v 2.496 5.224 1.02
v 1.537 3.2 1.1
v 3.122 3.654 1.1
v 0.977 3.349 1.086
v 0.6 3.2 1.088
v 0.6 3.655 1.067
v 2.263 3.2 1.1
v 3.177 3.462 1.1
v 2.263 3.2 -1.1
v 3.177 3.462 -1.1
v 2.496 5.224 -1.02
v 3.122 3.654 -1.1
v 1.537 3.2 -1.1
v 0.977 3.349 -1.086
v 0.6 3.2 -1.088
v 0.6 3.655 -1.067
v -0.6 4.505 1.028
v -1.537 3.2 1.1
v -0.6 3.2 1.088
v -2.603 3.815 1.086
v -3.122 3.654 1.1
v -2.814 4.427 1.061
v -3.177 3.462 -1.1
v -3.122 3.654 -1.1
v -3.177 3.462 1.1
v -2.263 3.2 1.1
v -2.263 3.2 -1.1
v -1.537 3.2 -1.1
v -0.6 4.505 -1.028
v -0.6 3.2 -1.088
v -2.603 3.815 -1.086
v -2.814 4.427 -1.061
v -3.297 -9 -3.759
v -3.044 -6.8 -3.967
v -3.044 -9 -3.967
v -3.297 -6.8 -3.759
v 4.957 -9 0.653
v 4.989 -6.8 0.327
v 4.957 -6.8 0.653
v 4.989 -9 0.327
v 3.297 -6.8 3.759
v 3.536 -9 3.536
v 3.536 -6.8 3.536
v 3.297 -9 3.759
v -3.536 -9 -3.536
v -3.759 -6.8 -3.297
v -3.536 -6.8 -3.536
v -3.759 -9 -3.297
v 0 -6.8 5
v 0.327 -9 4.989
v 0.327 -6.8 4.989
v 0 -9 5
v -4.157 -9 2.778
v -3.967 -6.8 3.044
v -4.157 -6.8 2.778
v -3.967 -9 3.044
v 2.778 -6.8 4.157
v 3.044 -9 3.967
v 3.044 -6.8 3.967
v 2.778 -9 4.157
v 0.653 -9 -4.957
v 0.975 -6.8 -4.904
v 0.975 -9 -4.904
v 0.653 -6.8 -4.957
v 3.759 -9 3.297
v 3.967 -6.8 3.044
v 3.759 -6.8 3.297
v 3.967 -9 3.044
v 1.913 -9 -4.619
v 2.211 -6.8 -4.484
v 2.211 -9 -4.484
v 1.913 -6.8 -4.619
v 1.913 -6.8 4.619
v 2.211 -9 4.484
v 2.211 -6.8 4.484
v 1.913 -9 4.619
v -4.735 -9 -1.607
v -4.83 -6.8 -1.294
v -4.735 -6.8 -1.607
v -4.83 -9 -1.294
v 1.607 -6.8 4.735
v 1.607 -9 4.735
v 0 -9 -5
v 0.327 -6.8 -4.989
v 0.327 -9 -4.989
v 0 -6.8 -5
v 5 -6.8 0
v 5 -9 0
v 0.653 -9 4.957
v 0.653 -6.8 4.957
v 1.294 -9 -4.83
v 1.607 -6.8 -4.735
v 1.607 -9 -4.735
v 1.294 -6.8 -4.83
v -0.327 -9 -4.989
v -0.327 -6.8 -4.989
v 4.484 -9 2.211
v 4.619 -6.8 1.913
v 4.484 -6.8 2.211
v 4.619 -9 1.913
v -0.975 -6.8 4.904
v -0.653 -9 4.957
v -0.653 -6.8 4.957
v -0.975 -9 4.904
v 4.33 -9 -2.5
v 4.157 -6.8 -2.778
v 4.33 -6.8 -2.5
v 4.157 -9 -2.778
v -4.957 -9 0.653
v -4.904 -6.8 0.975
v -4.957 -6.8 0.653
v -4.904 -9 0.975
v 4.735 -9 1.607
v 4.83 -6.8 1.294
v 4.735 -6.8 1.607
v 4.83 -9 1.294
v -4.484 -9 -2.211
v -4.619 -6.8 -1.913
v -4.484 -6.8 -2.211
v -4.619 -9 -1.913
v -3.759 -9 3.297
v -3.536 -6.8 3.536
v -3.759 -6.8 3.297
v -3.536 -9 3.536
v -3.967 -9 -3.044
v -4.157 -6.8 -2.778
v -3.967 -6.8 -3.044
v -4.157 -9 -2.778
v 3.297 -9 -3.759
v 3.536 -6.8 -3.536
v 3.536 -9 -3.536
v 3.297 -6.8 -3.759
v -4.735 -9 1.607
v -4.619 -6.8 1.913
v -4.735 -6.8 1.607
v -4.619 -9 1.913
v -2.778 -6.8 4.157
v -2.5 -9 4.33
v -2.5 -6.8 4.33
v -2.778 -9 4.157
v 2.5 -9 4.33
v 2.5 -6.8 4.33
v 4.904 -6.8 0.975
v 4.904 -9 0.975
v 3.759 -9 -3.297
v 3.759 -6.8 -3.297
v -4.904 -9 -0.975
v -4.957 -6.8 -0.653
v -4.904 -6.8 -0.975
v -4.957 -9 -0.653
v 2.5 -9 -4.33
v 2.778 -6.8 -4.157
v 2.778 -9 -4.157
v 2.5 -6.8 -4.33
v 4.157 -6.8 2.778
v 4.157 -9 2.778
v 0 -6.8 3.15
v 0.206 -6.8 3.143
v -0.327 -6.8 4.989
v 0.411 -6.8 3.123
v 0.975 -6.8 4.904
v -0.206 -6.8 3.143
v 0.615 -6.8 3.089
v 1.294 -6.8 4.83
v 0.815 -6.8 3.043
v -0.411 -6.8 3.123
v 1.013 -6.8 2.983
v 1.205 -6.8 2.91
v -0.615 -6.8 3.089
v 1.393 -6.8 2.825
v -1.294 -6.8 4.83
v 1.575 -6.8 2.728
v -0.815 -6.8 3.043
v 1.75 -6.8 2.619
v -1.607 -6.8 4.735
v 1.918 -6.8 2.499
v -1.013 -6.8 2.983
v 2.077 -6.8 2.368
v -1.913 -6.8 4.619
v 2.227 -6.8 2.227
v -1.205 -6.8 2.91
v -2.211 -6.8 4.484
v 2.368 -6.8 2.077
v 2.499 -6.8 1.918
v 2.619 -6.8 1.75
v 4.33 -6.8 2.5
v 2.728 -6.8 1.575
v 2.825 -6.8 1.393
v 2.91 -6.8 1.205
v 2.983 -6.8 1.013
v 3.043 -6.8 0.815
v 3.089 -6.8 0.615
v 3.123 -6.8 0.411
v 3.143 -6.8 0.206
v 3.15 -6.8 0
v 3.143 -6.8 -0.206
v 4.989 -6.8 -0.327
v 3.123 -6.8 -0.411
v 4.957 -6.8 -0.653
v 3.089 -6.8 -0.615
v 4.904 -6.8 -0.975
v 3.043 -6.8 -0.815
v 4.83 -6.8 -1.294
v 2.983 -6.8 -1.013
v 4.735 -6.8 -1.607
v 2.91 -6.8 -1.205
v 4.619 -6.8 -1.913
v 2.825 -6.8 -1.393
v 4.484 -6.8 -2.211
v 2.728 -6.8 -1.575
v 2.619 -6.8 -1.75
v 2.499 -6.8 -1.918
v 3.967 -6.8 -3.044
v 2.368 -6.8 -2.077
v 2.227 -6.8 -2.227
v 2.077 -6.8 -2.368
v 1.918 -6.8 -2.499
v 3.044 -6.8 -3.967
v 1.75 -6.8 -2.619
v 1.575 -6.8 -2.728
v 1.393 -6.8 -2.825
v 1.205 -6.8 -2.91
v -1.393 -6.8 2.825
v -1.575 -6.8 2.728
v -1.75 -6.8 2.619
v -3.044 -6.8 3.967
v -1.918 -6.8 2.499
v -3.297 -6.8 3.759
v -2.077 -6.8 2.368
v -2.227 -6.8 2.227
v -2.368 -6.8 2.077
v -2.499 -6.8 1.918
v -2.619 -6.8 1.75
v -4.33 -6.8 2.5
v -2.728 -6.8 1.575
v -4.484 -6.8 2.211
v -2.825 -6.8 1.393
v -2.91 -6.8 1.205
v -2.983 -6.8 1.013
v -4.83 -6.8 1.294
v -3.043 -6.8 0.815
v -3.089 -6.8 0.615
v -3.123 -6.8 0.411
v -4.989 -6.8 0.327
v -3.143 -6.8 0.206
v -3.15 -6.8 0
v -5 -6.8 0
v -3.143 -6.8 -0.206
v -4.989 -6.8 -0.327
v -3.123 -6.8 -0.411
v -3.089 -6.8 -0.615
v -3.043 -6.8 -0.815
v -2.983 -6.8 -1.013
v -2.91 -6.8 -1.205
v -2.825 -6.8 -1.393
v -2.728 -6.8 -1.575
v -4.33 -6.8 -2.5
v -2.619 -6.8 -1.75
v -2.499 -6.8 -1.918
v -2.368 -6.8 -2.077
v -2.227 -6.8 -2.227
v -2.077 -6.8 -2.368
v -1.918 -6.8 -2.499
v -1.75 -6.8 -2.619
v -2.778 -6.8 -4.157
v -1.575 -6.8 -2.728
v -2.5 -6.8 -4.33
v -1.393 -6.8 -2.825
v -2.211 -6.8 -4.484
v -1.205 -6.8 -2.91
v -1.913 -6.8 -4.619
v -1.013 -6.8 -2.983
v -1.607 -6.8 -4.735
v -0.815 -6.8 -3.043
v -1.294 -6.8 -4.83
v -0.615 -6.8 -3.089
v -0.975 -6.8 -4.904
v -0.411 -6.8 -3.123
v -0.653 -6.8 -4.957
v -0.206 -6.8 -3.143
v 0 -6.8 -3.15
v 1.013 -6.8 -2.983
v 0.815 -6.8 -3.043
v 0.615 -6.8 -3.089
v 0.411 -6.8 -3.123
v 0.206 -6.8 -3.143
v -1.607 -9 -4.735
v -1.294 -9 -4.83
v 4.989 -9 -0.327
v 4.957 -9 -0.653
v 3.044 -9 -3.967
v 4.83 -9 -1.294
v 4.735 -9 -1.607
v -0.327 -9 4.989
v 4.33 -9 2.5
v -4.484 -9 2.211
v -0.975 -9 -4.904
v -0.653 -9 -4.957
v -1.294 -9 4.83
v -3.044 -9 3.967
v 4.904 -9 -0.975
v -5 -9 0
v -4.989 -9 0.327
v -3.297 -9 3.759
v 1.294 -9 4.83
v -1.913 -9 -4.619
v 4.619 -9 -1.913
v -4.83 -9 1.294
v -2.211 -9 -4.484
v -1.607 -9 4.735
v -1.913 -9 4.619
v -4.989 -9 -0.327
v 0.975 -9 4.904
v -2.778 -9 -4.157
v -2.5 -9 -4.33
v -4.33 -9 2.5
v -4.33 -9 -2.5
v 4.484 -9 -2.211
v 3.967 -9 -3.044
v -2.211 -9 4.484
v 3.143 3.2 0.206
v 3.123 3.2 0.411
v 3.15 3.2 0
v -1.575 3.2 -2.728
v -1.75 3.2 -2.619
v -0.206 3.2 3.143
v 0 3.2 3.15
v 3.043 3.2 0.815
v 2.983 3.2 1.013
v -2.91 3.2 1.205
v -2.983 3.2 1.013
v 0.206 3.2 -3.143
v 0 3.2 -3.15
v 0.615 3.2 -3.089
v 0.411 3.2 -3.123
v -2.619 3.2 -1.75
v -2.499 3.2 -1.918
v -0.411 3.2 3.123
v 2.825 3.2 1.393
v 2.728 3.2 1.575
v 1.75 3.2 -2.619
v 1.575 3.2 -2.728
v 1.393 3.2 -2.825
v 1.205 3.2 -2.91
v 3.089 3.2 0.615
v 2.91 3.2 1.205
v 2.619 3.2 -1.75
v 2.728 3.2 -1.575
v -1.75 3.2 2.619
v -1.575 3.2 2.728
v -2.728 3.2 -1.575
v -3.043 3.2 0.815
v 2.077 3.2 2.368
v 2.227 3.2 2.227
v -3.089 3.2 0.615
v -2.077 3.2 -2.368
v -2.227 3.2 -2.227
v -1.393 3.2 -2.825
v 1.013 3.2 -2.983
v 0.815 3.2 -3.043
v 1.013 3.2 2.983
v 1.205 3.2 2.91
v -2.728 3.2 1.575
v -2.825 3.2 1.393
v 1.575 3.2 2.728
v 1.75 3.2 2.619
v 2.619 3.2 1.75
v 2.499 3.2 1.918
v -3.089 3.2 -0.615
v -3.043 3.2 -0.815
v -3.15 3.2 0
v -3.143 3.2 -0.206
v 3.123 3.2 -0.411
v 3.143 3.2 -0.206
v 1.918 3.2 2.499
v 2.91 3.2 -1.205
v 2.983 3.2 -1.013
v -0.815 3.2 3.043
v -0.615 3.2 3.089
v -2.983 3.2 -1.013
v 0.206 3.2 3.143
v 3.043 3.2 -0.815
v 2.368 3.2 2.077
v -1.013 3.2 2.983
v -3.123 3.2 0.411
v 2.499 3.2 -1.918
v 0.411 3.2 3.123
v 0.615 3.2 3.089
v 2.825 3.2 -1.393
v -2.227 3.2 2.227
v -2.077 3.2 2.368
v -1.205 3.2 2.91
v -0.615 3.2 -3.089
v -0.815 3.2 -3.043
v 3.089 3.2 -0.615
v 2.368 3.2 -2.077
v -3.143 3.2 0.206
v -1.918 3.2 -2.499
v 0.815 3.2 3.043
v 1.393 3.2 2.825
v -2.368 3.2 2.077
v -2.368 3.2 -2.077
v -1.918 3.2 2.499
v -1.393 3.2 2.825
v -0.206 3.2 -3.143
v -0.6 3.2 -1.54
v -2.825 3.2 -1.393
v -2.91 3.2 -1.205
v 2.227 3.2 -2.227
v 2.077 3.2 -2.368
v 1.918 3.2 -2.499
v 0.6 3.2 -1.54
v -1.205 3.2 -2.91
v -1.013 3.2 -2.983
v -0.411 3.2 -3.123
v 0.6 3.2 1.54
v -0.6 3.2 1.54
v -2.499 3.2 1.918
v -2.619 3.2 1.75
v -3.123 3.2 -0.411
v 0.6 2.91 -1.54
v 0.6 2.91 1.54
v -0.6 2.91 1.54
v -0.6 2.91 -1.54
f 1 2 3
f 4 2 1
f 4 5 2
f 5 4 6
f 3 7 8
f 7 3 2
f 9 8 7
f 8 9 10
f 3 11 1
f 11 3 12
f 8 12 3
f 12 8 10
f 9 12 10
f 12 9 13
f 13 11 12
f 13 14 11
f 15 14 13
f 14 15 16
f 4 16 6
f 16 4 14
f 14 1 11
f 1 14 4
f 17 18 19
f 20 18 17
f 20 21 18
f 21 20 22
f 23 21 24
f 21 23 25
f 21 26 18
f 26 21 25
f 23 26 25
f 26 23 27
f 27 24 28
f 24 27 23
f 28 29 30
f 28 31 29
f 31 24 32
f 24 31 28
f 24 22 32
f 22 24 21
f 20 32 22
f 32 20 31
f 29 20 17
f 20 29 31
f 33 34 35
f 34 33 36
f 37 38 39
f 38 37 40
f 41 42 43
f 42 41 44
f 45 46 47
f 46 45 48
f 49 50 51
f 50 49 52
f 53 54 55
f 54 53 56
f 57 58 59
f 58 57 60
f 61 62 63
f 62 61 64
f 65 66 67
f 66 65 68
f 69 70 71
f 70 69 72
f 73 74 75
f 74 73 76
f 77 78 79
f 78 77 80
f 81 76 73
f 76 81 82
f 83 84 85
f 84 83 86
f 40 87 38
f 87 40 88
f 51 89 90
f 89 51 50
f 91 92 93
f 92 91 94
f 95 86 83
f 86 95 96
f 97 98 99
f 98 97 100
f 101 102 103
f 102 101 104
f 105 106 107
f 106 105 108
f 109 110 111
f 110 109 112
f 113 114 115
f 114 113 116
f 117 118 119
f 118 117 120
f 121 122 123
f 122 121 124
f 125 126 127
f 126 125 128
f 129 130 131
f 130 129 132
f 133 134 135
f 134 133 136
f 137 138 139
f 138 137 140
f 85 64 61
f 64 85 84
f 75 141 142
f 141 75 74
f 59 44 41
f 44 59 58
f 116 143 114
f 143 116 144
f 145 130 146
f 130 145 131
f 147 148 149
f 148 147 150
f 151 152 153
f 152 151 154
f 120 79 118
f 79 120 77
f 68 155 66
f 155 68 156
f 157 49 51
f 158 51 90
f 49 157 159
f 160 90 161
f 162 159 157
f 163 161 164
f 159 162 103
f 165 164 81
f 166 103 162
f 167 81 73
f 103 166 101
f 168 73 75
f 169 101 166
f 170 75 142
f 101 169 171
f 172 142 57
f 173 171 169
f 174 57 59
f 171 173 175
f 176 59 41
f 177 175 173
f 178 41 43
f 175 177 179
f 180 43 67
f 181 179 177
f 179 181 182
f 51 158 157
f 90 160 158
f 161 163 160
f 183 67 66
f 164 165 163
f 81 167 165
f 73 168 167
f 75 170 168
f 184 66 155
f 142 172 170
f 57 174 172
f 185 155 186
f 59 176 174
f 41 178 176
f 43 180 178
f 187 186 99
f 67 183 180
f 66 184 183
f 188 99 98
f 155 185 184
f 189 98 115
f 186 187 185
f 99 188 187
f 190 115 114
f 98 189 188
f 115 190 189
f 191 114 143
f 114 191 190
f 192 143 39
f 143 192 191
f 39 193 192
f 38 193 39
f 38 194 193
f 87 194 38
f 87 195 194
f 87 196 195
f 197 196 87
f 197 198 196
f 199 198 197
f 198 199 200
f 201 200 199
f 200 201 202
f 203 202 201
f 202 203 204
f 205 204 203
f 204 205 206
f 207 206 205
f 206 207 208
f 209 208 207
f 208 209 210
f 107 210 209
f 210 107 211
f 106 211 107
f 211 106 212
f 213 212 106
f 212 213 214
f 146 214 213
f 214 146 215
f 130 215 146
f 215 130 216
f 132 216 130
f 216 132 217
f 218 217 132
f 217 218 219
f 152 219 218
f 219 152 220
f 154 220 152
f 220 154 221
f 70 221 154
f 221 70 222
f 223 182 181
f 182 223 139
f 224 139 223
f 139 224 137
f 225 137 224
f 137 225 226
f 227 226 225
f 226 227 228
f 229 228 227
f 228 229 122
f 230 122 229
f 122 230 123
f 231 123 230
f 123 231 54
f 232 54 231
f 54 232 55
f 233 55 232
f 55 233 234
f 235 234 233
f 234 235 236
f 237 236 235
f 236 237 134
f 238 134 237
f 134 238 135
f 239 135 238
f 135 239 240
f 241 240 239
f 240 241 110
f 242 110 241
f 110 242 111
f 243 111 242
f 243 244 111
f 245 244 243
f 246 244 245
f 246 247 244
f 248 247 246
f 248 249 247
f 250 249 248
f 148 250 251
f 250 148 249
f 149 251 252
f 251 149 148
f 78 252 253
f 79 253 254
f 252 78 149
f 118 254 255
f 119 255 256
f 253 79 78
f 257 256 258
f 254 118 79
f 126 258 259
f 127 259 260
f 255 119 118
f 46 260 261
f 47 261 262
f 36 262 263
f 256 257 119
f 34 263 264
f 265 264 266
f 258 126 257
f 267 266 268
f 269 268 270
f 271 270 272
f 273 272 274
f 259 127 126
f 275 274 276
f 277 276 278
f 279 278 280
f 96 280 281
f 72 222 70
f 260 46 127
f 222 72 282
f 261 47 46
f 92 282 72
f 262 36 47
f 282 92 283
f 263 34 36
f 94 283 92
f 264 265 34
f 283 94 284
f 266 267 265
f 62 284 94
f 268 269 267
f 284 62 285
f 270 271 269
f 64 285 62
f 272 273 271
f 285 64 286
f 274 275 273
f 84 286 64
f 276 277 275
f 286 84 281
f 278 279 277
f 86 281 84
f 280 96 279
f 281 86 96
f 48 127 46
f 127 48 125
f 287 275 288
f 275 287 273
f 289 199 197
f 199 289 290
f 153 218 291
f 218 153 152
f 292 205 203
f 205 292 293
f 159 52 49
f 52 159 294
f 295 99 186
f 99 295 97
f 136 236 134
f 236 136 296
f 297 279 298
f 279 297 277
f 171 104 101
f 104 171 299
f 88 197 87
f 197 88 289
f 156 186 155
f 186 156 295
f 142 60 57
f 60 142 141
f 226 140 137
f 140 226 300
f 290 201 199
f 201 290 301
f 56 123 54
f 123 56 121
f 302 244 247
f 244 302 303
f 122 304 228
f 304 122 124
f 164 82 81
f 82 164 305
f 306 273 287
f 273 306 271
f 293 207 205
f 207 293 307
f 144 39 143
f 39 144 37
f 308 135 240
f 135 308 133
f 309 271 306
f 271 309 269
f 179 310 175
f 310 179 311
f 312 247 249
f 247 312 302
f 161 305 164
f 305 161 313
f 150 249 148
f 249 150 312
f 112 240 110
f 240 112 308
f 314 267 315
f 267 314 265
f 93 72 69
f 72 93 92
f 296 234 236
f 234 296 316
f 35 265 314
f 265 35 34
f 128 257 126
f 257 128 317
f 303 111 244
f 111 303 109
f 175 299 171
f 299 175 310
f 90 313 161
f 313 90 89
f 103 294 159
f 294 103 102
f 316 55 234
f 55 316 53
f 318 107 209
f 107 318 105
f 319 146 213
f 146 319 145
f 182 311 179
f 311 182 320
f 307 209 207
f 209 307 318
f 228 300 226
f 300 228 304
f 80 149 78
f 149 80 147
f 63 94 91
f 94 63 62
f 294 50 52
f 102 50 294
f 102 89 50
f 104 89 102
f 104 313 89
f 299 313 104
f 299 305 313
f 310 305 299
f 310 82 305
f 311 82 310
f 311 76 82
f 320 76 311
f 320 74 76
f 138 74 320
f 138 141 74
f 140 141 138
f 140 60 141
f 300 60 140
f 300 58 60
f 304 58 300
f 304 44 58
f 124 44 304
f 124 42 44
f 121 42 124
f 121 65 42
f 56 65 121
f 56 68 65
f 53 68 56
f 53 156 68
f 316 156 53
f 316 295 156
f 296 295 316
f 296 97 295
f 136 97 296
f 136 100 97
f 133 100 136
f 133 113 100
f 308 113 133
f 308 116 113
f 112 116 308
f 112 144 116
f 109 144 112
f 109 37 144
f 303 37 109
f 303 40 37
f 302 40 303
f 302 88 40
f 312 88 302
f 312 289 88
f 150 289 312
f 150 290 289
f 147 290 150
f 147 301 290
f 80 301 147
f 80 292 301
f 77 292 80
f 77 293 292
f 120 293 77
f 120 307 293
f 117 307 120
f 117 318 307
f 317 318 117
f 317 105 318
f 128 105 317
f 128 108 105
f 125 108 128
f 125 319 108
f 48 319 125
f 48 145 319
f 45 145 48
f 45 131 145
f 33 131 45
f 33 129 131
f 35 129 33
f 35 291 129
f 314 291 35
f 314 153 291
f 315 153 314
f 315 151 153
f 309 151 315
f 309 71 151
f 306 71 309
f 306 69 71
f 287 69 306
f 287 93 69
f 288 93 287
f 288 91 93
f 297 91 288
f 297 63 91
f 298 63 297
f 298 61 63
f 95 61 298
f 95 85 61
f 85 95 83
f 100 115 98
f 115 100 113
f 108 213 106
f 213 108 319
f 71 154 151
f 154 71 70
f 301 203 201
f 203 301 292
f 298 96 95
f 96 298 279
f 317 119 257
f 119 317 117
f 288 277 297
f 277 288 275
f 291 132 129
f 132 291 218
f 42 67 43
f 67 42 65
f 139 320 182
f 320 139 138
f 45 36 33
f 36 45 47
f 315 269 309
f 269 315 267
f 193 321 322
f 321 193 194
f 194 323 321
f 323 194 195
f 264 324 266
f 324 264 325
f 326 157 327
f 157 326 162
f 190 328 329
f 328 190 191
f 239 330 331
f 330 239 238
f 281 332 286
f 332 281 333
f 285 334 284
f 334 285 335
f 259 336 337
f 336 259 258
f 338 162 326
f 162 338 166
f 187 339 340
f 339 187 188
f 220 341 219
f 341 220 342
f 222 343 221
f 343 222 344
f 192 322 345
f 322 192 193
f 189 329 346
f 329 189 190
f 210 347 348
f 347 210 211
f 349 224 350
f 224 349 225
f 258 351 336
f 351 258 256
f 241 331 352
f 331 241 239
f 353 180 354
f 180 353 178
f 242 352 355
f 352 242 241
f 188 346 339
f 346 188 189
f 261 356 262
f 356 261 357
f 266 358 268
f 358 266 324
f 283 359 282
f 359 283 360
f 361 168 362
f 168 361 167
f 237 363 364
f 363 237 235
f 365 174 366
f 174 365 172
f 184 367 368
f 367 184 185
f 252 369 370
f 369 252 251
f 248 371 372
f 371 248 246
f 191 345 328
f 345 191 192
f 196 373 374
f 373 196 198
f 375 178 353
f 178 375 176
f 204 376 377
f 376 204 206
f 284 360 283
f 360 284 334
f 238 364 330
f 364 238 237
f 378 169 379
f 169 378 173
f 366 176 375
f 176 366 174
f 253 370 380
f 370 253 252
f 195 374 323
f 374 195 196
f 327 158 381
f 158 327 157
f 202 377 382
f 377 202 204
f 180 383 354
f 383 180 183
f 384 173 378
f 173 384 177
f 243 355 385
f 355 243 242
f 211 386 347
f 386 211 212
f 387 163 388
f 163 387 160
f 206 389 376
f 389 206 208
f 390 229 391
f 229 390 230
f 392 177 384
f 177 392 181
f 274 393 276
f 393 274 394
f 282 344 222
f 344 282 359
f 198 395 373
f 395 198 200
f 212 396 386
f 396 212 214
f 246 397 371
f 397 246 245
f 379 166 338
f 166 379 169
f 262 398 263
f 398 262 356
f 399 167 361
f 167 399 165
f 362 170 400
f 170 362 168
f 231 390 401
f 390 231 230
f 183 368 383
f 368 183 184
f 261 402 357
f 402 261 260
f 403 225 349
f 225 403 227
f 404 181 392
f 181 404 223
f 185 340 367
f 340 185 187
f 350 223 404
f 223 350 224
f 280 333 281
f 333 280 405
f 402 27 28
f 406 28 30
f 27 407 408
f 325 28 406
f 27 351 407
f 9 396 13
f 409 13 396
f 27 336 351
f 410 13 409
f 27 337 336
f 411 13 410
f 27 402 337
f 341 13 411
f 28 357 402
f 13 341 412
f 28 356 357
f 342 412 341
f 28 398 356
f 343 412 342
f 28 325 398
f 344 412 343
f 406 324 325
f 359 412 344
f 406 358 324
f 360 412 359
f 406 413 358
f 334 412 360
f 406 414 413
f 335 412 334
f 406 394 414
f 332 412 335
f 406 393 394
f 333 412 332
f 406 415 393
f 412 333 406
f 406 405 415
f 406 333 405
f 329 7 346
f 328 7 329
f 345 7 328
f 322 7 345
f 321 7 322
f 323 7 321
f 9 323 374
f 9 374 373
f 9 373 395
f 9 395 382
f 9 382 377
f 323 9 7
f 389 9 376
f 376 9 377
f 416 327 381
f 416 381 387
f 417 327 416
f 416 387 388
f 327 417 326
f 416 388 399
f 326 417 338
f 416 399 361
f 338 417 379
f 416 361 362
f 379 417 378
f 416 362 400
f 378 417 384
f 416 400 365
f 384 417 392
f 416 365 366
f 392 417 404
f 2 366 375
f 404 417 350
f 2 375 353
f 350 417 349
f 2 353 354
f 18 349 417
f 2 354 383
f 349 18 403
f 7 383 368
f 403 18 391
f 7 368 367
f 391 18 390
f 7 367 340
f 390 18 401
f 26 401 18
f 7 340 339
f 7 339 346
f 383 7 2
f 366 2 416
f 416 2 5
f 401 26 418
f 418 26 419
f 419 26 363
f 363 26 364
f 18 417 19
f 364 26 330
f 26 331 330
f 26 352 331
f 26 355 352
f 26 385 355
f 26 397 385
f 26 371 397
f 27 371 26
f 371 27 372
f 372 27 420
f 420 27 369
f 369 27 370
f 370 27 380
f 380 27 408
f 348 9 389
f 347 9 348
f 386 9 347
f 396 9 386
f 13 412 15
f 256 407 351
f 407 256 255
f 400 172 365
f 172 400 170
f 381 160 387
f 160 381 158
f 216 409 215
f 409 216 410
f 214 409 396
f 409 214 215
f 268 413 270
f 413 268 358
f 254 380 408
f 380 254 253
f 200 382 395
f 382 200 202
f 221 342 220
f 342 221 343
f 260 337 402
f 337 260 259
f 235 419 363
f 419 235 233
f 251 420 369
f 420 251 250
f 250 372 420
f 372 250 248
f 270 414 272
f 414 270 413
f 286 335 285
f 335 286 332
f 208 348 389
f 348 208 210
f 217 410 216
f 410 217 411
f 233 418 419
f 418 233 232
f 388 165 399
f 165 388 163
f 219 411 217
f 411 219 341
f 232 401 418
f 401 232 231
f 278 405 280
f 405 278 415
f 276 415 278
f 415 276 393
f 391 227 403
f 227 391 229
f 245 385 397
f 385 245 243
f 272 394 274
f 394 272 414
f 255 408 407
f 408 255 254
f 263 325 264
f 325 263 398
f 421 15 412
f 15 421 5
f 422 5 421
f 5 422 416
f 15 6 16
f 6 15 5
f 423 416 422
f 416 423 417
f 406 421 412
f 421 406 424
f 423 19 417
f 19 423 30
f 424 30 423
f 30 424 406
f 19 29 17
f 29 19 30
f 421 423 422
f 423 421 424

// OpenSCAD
$fn=96;

bbox_x = 10.0;
bbox_y = 18.0;
bbox_z = 6.3;

head_d = 10.0;
head_t = 2.2;

shank_d = 6.3;
shank_len = 10.0;

prong_len = 5.8;
prong_th = 2.2;
prong_w = 2.6;
gap = 1.2;
spread = 1.6;

y_min = -bbox_y/2;
y_max =  bbox_y/2;

module head_flange() {
    translate([0, y_min + head_t/2, 0])
        rotate([90,0,0])
            cylinder(d=head_d, h=head_t, center=true);
}

module shank() {
    translate([0, y_min + head_t + shank_len/2, 0])
        rotate([90,0,0])
            cylinder(d=shank_d, h=shank_len, center=true);
}

module prong_body() {
    hull() {
        translate([0,0,0]) cube([prong_w, 0.2, prong_th], center=true);
        translate([0,prong_len,0]) cube([prong_w*0.55, 0.2, prong_th*0.75], center=true);
    }
}

module prong_cut_tip() {
    translate([0, prong_len*0.72, 0])
        rotate([0,0,35])
            cube([prong_w*2.2, prong_len*0.9, prong_th*2.2], center=true);
}

module prong(side=1) {
    translate([side*(gap/2 + prong_w/2), 0, 0])
        rotate([0,0,side*spread*10])
            difference() {
                prong_body();
                prong_cut_tip();
            }
}

module fork_prongs() {
    y0 = y_min + head_t + shank_len;
    translate([0, y0, 0]) {
        prong(1);
        prong(-1);
        translate([0, prong_len*0.35, 0])
            cube([gap*0.9, prong_len*0.7, prong_th*0.9], center=true);
    }
}

module center_slot() {
    y0 = y_min + head_t + shank_len;
    translate([0, y0 + prong_len*0.55, 0])
        cube([gap, prong_len*1.2, prong_th*1.4], center=true);
}

difference() {
    union() {
        head_flange();
        shank();
        fork_prongs();
    }
    center_slot();
}
